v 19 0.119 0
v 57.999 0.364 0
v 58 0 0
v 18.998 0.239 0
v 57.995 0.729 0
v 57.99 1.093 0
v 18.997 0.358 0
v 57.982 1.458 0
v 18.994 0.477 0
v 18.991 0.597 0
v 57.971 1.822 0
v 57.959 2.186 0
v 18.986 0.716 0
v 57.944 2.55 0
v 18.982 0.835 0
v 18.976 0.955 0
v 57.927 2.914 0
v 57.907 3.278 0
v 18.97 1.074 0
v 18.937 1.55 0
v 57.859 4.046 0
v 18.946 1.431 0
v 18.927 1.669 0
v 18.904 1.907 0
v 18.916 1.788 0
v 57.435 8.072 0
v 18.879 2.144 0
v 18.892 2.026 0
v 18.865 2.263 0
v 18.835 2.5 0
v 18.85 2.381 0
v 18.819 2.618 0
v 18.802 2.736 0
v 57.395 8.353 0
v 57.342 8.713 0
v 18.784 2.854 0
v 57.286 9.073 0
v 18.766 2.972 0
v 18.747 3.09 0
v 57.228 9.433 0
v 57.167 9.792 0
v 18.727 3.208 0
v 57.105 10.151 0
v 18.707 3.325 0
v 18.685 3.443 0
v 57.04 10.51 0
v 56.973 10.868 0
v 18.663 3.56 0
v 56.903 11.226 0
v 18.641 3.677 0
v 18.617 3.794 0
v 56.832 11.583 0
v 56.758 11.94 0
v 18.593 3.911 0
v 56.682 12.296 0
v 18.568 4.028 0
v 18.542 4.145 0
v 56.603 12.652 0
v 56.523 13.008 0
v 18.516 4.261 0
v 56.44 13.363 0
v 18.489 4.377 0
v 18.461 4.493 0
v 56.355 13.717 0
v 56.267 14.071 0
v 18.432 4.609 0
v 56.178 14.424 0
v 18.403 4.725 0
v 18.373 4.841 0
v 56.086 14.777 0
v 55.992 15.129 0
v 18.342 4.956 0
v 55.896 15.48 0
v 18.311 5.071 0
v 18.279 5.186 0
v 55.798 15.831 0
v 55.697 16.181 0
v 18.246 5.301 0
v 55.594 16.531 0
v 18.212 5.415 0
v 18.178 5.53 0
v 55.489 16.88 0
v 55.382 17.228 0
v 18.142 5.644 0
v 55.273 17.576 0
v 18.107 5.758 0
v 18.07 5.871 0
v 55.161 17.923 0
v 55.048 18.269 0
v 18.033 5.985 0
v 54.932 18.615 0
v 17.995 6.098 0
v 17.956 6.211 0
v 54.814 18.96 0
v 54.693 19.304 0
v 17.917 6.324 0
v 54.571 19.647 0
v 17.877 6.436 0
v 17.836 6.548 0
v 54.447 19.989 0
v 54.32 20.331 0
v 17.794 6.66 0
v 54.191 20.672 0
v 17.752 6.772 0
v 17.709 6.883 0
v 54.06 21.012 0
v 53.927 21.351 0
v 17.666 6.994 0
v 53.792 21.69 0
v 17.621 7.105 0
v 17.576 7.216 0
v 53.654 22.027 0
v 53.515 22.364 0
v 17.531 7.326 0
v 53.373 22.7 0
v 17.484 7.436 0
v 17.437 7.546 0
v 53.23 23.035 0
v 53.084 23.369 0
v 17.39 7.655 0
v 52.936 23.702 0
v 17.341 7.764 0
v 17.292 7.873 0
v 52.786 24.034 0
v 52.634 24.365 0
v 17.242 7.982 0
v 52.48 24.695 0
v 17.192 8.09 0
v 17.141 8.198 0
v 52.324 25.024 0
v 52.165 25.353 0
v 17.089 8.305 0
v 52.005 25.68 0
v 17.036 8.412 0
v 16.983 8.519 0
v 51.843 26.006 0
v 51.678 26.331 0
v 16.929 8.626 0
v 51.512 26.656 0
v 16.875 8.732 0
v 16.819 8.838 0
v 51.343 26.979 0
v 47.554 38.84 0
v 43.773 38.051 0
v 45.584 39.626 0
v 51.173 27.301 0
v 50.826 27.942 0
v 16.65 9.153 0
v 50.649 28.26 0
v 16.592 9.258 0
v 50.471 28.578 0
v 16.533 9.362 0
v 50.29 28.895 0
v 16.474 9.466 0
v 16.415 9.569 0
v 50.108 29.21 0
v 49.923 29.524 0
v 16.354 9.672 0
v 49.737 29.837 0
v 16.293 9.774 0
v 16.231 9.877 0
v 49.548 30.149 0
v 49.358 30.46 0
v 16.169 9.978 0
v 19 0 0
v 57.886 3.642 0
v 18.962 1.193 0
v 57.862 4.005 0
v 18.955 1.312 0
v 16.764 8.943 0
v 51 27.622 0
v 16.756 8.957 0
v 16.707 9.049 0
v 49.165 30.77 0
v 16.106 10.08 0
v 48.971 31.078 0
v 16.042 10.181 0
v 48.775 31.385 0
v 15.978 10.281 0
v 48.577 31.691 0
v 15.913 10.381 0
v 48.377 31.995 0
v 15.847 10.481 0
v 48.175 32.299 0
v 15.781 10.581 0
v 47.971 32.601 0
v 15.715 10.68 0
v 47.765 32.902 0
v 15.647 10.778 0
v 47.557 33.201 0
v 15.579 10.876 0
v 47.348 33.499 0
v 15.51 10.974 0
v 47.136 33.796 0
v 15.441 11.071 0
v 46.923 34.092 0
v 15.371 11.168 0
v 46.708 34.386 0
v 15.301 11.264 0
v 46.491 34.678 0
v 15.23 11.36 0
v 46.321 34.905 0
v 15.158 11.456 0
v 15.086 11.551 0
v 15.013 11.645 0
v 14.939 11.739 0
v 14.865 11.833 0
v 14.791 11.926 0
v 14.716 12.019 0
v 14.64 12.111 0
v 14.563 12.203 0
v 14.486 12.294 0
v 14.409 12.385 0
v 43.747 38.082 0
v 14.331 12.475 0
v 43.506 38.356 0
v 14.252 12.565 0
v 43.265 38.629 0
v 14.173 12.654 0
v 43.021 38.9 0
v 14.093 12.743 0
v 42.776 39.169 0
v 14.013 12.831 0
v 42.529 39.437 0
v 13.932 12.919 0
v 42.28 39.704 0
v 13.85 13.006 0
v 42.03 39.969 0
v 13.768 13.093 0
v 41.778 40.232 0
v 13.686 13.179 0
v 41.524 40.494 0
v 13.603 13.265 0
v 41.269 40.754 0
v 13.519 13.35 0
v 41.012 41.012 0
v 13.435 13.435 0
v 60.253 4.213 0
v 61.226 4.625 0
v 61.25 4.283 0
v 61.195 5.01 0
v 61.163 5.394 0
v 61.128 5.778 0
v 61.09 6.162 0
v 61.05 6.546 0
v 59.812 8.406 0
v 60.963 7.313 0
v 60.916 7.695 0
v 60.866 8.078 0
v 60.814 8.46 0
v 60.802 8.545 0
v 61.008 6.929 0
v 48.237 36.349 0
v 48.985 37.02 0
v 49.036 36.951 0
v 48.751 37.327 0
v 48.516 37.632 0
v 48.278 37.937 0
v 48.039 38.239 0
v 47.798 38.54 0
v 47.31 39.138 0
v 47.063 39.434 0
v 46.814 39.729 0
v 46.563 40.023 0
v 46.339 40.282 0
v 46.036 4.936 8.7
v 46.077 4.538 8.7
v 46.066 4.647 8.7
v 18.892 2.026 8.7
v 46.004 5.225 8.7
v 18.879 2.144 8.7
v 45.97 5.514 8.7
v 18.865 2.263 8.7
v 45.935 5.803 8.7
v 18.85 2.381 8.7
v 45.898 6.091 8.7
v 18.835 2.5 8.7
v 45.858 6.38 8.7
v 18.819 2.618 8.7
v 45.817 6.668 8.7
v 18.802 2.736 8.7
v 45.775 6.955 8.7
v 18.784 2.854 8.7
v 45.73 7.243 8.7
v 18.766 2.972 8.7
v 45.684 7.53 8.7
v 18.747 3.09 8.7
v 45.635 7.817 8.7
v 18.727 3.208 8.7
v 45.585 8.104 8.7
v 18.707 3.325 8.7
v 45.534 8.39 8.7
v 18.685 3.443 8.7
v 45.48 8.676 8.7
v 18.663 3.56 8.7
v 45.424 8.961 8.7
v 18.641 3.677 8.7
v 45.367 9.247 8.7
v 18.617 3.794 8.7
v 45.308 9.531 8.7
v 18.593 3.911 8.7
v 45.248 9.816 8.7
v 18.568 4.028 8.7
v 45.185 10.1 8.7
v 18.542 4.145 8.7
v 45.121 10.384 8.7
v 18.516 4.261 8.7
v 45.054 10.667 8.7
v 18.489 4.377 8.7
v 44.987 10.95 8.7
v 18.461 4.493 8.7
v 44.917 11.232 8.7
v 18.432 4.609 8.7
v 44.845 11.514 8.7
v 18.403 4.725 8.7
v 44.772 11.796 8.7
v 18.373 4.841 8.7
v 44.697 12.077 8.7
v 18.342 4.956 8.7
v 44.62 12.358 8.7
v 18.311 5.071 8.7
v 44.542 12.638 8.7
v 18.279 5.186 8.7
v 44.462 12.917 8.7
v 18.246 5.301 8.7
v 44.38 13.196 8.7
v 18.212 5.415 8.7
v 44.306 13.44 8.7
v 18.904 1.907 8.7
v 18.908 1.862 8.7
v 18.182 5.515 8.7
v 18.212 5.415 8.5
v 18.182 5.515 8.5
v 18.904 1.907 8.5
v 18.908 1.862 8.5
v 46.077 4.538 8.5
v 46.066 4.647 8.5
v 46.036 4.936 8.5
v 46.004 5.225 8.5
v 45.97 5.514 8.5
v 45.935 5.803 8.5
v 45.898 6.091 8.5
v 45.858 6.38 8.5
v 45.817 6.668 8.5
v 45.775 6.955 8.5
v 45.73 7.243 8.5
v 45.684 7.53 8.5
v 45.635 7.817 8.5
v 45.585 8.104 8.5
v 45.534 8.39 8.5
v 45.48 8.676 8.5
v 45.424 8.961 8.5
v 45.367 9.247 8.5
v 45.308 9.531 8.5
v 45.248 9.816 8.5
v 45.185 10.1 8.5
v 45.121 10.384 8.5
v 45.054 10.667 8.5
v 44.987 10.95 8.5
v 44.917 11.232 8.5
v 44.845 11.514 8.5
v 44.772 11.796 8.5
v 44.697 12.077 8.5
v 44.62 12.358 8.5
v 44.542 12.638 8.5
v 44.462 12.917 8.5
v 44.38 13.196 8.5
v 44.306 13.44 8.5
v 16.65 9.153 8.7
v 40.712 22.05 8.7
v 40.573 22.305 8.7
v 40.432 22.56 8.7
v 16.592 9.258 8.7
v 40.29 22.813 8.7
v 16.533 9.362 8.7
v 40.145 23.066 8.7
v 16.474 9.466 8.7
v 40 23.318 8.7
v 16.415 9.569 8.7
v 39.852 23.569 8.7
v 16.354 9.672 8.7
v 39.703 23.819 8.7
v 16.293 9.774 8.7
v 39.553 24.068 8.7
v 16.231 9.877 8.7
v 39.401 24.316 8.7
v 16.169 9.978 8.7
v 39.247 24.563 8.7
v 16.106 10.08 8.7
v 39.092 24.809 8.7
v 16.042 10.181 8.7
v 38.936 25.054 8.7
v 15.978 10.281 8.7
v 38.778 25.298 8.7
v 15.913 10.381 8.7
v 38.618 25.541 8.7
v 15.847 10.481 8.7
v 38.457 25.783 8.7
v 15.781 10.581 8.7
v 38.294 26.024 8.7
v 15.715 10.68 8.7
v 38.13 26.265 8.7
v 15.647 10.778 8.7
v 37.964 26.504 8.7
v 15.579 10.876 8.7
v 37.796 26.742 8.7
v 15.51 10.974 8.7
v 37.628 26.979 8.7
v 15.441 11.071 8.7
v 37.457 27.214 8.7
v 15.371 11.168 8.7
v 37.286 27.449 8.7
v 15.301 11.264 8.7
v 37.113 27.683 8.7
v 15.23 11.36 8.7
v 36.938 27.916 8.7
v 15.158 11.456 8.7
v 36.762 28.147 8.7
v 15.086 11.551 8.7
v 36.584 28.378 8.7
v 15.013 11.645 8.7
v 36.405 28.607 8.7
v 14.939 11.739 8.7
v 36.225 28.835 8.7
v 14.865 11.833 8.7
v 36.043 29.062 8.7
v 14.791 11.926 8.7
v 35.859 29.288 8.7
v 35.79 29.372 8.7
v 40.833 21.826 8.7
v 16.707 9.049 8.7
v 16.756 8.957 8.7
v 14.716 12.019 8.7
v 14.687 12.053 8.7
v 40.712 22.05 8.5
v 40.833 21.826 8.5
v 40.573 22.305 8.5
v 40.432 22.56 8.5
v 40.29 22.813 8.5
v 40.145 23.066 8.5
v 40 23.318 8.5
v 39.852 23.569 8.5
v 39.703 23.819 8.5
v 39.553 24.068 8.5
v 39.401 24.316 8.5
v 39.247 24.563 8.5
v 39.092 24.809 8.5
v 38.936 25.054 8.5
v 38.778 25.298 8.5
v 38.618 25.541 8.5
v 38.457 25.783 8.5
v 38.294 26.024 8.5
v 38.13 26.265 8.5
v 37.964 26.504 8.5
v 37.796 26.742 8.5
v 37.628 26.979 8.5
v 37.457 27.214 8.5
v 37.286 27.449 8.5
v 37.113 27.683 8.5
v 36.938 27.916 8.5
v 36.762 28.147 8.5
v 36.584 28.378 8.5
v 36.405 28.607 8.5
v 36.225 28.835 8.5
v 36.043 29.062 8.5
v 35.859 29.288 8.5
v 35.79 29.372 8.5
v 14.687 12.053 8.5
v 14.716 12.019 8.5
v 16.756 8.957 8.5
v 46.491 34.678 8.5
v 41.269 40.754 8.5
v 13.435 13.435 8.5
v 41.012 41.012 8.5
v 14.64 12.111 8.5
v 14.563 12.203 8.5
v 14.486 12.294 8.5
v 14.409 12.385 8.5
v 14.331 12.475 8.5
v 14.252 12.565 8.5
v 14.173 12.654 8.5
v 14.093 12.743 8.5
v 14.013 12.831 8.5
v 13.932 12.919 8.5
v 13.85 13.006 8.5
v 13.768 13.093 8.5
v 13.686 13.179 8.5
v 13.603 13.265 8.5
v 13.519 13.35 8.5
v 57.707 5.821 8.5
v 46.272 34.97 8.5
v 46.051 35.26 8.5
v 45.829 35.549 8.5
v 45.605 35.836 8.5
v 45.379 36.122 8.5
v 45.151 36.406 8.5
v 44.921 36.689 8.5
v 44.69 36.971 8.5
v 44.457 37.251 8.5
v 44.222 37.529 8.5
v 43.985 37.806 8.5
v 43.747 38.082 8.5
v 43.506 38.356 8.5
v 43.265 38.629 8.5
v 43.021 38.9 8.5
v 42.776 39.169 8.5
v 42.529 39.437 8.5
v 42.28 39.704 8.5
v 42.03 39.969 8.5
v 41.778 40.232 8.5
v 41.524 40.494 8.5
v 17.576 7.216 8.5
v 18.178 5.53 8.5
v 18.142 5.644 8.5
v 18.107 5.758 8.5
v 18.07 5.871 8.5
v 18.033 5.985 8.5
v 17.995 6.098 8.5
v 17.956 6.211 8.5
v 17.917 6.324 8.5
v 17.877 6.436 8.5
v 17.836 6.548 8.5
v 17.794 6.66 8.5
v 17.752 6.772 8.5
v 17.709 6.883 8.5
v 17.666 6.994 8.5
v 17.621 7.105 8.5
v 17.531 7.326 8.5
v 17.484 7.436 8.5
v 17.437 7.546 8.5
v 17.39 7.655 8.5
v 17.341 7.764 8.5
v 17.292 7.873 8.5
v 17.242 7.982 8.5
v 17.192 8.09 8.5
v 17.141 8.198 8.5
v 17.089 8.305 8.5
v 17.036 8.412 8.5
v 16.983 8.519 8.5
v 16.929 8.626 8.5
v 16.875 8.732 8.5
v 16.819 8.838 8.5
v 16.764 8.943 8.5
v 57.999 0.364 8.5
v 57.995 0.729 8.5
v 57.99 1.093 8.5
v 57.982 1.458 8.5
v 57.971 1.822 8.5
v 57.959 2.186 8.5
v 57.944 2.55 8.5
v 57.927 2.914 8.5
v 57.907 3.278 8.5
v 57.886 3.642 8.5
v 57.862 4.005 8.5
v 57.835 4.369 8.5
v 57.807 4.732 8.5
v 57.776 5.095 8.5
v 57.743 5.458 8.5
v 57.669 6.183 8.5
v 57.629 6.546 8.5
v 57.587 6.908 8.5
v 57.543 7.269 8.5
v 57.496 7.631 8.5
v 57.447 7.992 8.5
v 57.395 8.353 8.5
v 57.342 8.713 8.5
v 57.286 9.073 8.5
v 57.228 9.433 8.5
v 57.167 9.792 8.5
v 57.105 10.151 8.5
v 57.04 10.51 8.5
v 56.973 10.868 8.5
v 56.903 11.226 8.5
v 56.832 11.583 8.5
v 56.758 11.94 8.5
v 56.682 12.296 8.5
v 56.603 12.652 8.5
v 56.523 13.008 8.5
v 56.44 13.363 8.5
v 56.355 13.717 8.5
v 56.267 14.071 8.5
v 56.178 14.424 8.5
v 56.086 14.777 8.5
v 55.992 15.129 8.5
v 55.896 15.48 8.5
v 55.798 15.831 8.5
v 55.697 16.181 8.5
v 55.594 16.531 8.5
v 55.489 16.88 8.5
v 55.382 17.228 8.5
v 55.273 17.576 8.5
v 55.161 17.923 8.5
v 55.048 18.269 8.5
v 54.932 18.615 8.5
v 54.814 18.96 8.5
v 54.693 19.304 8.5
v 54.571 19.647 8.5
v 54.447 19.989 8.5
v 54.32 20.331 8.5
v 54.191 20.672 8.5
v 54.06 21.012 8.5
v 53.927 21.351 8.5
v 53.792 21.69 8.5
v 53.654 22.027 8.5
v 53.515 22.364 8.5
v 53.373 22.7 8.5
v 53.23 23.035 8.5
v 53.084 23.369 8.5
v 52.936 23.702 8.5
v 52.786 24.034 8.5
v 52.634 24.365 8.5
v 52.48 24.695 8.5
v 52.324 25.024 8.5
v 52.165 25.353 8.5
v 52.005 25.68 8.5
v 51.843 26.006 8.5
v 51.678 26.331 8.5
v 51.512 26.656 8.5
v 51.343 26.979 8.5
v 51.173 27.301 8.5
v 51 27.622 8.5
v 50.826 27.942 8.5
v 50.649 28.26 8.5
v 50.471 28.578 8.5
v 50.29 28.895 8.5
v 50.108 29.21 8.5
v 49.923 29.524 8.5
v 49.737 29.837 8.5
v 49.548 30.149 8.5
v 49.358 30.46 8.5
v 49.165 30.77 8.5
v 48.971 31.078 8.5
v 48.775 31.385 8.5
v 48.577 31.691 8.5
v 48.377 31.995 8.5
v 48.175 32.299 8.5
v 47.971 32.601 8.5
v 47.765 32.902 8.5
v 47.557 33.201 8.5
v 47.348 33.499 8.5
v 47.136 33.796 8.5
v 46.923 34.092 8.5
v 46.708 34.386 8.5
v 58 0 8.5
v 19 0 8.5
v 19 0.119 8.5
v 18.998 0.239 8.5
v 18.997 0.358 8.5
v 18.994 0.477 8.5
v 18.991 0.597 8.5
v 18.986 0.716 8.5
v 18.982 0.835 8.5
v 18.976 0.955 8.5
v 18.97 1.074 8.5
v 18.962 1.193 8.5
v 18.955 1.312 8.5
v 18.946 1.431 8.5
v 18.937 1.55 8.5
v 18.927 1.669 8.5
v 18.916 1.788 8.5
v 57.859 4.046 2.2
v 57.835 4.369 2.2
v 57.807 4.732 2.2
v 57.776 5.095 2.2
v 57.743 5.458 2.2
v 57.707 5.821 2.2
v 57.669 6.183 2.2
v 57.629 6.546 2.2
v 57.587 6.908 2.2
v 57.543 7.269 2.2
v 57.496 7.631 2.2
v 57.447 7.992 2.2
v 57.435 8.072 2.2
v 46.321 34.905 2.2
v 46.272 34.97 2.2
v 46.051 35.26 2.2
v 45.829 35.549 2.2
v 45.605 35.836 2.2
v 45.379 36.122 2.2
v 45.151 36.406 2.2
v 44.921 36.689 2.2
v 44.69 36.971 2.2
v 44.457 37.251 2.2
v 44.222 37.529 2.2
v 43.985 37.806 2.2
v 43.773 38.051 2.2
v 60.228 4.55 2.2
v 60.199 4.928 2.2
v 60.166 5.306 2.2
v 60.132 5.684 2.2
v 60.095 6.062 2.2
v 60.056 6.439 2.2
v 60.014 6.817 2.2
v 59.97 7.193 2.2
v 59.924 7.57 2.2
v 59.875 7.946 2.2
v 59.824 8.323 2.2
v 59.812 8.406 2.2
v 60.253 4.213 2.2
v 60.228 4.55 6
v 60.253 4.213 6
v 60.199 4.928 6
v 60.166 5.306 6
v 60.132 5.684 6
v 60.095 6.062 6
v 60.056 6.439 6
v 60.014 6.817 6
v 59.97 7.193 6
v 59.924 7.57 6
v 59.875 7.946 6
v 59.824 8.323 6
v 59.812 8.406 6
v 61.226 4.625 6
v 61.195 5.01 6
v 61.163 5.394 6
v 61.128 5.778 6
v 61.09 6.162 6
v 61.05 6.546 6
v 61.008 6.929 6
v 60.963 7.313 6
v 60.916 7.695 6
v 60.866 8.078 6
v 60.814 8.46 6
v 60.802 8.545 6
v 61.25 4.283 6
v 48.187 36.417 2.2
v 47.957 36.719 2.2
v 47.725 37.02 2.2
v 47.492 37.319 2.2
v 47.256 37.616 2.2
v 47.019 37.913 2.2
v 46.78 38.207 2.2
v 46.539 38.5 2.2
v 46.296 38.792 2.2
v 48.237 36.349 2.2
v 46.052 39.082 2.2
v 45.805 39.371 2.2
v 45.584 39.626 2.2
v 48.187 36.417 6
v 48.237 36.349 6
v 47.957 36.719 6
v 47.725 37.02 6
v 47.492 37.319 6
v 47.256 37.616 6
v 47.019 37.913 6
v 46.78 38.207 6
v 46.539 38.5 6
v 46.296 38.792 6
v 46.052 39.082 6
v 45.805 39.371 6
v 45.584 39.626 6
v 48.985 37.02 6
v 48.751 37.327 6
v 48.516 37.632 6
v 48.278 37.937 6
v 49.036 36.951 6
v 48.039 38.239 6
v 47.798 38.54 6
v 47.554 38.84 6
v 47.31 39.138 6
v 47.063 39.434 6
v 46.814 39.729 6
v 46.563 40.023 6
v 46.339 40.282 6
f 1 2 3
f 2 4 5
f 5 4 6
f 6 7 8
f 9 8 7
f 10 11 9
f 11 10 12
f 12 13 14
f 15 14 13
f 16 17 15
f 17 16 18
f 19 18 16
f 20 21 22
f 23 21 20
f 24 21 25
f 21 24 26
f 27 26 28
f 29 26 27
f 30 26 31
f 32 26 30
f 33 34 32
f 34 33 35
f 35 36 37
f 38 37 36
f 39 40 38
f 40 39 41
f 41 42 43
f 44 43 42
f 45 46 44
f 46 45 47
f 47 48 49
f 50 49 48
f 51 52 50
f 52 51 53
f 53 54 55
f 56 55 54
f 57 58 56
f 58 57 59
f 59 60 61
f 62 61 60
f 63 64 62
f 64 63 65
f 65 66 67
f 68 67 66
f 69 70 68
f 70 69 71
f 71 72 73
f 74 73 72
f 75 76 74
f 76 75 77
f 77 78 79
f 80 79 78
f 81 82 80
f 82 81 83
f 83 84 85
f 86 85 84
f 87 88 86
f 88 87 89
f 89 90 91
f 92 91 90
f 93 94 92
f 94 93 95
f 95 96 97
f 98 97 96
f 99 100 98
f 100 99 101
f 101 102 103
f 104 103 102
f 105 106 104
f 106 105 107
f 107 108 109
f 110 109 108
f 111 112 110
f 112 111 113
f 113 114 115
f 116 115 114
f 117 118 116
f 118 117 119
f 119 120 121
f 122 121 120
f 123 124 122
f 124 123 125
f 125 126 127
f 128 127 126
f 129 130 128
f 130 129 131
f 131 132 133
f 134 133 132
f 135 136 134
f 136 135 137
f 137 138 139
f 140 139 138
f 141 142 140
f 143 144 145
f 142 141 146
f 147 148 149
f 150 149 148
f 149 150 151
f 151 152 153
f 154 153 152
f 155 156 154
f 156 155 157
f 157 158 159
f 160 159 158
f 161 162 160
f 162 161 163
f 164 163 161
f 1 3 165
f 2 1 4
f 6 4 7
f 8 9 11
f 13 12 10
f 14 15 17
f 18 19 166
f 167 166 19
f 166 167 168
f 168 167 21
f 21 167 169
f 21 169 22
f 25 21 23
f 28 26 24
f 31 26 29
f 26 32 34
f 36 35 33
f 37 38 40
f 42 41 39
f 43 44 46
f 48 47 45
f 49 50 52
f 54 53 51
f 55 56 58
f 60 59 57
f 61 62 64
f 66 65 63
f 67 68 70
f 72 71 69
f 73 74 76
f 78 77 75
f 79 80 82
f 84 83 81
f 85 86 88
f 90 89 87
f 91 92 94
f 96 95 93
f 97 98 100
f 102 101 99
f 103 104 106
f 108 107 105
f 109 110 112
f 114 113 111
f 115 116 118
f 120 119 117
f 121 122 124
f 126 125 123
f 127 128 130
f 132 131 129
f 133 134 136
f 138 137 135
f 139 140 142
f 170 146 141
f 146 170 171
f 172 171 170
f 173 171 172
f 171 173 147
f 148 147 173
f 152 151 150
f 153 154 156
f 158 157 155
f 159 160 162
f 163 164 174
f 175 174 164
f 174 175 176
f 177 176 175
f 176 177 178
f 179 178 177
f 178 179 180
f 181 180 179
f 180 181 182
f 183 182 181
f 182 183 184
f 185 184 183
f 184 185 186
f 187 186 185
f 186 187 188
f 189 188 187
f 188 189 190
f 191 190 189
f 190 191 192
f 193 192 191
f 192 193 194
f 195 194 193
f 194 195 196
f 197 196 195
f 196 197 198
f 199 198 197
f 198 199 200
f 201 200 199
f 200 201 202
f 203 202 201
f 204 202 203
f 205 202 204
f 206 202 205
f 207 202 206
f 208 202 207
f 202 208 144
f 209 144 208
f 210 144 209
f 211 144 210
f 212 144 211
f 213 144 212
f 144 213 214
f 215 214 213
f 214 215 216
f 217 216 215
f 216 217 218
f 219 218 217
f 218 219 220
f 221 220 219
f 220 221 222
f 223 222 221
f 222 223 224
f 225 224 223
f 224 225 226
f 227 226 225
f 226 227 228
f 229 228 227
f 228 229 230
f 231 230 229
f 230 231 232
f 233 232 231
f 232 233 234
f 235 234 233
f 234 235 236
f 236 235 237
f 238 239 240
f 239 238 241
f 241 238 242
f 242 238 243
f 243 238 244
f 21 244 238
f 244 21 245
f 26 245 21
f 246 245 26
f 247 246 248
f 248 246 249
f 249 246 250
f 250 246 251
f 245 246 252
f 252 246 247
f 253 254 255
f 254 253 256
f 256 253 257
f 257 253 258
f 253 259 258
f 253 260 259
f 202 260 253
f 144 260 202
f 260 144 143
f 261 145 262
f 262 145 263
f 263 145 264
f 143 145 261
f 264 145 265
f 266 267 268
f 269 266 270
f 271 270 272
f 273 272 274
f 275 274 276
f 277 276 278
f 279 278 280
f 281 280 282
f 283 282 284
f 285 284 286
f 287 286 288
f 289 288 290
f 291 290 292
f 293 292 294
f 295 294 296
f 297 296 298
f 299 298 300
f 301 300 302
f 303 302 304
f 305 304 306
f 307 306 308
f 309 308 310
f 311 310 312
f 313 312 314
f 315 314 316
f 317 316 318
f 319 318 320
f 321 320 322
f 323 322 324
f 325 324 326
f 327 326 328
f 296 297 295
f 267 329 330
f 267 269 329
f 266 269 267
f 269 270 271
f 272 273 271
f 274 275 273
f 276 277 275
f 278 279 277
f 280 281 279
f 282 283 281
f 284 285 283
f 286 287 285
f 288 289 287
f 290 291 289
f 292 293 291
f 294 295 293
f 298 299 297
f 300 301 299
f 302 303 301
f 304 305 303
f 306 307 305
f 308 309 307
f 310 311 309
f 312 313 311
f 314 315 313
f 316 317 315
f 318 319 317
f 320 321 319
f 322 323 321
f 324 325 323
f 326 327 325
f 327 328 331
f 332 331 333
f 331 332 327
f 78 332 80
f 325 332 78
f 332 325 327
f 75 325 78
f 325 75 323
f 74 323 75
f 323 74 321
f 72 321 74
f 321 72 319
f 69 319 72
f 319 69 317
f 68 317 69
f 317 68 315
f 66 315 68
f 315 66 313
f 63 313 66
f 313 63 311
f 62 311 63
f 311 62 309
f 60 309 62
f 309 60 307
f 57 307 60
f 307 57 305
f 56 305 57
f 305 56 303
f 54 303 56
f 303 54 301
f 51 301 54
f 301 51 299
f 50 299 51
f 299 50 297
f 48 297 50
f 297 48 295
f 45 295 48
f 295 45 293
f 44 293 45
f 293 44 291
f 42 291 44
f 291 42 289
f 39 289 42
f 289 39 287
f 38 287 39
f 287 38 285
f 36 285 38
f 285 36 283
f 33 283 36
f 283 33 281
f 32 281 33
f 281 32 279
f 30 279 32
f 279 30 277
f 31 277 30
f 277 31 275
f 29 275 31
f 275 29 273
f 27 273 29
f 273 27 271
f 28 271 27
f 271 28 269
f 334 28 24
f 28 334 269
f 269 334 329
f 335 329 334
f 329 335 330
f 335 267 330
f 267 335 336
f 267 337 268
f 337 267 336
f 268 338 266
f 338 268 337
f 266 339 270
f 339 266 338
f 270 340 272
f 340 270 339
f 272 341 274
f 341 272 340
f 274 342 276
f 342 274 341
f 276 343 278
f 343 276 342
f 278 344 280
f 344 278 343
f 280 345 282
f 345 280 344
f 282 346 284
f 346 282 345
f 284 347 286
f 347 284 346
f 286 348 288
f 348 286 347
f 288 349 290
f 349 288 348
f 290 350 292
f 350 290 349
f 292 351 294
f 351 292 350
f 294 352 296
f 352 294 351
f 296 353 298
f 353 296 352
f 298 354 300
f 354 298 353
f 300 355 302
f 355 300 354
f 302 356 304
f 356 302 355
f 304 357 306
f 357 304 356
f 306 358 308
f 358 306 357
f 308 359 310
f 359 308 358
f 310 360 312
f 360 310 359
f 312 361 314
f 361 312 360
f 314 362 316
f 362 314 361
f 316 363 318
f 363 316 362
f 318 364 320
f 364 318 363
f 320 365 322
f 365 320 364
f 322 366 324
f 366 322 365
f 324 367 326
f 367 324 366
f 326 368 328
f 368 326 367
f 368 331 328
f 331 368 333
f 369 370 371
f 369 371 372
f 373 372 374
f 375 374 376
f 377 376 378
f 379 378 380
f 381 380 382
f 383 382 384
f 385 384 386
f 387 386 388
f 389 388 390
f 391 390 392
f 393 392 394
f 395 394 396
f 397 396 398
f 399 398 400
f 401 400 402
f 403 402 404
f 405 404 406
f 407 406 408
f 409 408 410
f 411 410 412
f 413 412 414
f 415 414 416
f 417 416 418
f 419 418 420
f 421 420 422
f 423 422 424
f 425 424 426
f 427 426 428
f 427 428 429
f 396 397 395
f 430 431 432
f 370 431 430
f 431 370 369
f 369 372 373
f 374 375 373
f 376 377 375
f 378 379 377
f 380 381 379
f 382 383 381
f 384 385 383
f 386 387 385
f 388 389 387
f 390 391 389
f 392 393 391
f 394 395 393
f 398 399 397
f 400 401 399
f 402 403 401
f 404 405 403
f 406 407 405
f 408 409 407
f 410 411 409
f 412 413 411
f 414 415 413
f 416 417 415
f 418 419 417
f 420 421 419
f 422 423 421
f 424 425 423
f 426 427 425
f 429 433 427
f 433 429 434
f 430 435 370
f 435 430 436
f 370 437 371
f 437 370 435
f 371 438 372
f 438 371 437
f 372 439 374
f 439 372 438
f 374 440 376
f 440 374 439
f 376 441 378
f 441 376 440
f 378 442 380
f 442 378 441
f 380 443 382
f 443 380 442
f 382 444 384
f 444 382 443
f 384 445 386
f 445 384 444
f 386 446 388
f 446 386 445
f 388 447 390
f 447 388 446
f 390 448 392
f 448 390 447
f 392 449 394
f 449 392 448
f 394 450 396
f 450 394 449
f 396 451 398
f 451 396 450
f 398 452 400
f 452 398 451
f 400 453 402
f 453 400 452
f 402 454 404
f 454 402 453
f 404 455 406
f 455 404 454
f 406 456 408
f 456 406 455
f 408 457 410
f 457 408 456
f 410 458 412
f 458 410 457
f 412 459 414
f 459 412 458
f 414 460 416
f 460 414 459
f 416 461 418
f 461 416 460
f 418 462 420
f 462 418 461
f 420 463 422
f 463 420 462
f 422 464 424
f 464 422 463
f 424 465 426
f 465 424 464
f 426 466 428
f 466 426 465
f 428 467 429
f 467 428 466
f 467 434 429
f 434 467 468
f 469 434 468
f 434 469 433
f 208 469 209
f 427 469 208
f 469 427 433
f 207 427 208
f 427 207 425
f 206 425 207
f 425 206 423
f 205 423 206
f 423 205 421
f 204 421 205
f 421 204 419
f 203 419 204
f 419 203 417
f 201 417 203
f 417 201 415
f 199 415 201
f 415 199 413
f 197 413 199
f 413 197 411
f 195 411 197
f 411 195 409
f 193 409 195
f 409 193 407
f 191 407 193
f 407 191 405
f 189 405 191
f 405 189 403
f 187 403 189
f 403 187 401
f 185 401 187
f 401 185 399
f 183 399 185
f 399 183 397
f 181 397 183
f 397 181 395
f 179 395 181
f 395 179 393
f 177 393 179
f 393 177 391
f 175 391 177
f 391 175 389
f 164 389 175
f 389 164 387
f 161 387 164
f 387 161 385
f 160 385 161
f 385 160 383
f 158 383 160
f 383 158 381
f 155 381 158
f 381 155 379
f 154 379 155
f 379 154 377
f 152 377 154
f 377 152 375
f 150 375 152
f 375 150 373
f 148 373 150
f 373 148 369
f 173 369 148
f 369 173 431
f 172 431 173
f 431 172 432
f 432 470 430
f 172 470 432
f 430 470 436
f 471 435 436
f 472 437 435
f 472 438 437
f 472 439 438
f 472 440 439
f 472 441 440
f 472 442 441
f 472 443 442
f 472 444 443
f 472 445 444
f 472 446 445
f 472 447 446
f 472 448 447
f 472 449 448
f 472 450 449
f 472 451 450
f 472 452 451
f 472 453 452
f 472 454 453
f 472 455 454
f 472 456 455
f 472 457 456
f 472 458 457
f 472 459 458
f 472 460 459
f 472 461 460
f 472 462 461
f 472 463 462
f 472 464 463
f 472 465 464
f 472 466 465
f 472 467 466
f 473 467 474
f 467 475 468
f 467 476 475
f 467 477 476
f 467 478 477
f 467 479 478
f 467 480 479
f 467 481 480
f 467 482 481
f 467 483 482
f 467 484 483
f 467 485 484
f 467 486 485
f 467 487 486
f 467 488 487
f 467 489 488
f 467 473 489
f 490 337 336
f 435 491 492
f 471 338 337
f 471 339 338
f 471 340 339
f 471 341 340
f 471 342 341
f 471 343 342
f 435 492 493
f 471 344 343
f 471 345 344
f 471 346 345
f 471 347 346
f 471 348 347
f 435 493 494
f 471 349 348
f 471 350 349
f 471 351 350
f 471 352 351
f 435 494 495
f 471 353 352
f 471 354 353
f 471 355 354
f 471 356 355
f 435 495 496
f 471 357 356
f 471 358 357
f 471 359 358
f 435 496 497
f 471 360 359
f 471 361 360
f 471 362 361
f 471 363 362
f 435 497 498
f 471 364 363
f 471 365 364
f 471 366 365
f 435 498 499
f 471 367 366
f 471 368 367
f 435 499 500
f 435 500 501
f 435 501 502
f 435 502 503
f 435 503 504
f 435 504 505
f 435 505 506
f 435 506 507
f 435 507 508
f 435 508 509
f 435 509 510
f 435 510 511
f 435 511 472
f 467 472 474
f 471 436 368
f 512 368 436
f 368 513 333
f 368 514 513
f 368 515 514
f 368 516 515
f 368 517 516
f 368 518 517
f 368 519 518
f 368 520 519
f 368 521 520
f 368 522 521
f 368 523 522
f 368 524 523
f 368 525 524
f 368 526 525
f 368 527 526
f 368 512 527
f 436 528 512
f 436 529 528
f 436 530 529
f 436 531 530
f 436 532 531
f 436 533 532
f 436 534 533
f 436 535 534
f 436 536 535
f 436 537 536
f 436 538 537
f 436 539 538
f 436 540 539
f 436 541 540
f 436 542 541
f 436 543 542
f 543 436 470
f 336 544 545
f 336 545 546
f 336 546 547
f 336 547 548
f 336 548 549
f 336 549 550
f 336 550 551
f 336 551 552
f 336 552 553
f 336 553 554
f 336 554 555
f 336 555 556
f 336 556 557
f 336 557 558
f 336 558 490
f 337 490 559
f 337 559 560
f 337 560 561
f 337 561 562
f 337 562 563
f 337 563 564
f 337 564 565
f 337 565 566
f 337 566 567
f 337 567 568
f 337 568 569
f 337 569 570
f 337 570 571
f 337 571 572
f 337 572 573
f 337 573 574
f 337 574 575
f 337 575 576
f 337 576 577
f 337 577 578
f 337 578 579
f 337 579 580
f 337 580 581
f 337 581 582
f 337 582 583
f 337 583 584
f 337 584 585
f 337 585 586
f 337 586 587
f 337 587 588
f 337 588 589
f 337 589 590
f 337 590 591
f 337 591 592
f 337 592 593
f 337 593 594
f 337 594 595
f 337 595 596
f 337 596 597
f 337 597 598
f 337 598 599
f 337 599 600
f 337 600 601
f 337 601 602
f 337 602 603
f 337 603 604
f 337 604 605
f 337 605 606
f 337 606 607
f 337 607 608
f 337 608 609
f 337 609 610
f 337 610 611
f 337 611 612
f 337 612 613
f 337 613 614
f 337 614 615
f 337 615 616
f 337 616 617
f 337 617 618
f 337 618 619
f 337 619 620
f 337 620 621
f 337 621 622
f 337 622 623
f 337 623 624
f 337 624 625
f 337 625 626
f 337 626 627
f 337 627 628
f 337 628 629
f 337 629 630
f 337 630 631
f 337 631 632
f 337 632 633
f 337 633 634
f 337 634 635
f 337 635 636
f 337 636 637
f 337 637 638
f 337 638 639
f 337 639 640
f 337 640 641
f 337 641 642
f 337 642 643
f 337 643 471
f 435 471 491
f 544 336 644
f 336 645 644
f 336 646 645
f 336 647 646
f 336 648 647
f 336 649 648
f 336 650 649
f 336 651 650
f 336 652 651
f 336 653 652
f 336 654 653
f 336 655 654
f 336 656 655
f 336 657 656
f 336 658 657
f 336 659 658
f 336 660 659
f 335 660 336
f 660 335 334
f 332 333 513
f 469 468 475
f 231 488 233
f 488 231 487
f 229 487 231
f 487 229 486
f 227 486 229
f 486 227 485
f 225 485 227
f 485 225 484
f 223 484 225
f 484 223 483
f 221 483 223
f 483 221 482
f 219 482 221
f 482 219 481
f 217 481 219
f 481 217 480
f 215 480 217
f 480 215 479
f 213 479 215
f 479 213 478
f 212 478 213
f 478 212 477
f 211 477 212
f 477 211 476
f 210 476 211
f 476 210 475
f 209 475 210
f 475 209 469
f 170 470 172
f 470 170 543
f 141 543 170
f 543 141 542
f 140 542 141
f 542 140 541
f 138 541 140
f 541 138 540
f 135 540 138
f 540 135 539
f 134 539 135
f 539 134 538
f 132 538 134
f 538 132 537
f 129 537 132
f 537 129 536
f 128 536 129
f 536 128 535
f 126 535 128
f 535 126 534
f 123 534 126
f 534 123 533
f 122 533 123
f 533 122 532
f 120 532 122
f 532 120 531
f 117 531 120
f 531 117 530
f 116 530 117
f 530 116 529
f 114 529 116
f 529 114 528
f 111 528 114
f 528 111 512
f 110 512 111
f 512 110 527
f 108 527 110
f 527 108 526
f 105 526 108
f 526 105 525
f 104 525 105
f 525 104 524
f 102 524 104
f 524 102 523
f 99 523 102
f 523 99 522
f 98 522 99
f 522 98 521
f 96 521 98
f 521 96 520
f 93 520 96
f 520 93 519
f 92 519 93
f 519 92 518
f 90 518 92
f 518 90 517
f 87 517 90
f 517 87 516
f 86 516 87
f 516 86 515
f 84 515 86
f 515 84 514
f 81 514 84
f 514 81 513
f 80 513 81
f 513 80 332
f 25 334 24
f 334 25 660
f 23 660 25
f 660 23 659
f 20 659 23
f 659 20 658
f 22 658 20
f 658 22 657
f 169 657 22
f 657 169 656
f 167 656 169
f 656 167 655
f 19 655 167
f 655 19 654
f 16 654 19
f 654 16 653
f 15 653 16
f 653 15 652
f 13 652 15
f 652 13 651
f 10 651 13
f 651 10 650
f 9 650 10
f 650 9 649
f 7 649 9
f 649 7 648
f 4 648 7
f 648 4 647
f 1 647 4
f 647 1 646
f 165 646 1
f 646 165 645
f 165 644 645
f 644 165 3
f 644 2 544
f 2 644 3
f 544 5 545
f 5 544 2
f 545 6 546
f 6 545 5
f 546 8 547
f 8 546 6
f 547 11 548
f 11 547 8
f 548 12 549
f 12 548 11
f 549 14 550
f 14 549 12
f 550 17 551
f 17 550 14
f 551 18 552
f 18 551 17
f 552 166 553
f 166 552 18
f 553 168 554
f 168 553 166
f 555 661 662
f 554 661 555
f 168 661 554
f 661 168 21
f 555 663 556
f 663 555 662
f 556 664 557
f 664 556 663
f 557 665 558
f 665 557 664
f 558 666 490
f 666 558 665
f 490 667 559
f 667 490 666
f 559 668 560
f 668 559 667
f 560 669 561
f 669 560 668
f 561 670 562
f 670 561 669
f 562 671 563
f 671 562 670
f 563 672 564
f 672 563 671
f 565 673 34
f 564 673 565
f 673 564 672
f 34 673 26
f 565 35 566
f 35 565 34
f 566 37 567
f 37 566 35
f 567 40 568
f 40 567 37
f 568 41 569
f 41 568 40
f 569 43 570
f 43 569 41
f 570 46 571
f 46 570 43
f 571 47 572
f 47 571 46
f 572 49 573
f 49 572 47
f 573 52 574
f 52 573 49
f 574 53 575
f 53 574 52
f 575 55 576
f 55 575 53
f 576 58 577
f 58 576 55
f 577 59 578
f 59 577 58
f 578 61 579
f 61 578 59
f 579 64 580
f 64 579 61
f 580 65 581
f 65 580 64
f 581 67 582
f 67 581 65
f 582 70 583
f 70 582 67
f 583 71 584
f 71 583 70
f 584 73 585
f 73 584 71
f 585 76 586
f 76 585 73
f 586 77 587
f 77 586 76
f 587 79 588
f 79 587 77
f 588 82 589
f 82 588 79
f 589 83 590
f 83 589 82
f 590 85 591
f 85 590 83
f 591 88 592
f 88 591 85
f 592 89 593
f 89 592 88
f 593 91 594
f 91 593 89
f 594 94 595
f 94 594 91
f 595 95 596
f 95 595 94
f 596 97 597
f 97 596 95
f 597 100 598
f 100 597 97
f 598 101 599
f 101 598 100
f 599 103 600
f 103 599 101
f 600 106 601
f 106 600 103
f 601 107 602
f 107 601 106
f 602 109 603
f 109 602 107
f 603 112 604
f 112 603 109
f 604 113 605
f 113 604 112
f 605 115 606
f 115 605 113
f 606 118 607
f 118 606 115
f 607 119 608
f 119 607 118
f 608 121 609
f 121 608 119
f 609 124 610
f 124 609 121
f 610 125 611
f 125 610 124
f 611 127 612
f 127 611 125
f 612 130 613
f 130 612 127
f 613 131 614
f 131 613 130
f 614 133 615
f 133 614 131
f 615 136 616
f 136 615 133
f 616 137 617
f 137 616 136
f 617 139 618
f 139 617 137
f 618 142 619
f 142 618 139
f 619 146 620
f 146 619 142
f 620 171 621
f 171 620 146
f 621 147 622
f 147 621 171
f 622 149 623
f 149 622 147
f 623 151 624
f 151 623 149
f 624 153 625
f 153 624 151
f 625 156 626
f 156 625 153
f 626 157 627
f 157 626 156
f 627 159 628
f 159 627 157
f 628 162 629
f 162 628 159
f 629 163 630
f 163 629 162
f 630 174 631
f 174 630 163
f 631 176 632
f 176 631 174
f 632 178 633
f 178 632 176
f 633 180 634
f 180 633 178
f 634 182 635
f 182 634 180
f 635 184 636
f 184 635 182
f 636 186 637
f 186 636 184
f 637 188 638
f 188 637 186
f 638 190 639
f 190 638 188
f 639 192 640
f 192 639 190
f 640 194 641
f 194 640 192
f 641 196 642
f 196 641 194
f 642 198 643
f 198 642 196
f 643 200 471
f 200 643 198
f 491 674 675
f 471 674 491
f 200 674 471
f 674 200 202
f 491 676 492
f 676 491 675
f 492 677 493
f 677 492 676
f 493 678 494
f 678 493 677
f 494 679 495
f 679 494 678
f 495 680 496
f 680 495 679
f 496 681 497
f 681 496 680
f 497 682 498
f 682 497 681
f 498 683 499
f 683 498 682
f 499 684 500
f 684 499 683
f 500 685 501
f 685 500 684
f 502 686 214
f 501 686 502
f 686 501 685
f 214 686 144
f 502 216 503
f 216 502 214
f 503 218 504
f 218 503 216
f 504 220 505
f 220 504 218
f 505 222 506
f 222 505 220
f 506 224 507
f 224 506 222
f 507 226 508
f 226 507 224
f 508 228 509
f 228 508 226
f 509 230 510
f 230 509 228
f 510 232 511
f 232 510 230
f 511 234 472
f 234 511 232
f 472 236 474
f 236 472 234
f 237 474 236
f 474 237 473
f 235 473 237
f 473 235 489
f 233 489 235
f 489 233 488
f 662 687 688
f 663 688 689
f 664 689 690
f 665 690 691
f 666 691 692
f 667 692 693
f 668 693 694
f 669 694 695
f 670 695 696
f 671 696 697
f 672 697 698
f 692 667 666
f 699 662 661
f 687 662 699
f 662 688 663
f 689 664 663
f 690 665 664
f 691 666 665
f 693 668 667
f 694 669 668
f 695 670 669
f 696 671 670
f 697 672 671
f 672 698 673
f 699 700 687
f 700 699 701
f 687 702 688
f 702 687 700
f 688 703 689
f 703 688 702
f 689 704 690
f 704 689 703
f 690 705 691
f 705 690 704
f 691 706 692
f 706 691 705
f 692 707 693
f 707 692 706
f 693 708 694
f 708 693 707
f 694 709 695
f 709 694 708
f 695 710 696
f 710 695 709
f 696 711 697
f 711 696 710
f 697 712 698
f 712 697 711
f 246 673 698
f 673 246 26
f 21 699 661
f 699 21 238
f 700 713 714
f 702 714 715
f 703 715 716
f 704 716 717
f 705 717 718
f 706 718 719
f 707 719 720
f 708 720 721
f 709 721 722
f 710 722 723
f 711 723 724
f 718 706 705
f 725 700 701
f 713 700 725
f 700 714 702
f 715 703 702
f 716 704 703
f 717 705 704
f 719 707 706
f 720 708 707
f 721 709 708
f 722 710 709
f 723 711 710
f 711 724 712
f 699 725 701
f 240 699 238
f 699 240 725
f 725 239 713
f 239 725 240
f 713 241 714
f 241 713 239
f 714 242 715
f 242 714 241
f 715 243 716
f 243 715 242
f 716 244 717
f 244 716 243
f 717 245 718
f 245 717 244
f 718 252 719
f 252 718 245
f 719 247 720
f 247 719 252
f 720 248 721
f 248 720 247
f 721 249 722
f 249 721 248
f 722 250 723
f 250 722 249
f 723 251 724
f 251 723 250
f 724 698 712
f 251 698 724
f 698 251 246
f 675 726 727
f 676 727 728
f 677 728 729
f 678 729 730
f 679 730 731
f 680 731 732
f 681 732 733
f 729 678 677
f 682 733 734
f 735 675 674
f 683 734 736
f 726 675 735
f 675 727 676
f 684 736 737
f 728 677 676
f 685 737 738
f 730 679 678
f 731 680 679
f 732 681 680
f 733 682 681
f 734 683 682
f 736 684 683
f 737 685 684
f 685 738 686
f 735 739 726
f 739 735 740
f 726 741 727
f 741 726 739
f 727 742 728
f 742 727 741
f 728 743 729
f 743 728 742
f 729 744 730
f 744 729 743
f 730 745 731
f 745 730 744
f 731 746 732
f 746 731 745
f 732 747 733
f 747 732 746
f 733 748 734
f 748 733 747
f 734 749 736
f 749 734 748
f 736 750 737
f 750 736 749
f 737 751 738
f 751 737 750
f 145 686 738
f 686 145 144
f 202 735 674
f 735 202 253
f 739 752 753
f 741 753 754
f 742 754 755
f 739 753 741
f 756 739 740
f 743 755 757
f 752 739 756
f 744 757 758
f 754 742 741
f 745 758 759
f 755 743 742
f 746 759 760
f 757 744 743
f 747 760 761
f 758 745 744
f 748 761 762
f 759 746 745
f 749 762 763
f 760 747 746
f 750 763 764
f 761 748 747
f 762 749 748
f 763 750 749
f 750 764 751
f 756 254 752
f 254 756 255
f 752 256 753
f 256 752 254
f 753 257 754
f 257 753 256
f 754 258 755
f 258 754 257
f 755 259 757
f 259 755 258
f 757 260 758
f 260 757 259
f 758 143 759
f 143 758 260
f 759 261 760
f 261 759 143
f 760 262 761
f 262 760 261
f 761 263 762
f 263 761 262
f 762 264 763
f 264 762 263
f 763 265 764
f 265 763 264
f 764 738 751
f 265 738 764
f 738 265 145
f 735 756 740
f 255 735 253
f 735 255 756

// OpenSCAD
// file: 3d_arc.scad
// https://openhome.cc/eGossip/OpenSCAD/SectorArc.html

module sector(radius, begin, end, fn) {
    r = radius / cos(180 / fn);
    step = -360 / fn;

    points = concat([[0, 0]],
        [for(a = [begin : step : end - 360]) 
            [r * cos(a), r * sin(a)]
        ],
        [[r * cos(end), r * sin(end)]]
    );

    difference() {
        circle(radius, $fn = fn); // cilinder
        polygon(points);
    }
}

module arc(radius, begin, end, width, fn) {
    difference() {
        sector(radius + width, begin, end, fn);
        sector(radius, begin, end, fn);
    }
} 


module 3d_arc(height, radius, width, begin, end, fn) {
    linear_extrude(height) arc(radius, begin, end, width, fn);
}
// main file
// https://openhome.cc/eGossip/OpenSCAD/SectorArc.html

// width is the angle
// lenght is distance from the center of the circunference
// height is the thinkness

include <3d_arc.scad>

fn = 1000;

// kerb

kerb_radius = 58; // mm
kerb_length = 39; // mm
kerb_height = 8.5; // mm
kerb_width = 45; // deg

3d_arc(kerb_height, kerb_radius - kerb_length, kerb_length, 0, kerb_width, fn);

// hooks

hook_offset = 4; // deg
hook_width = 4; // deg
hook_bend_height = 2.2; // mm
hook_bend_length = 2.4; // mm
hook_barb_height = 6; // mm
hook_barb_length = 1; // mm

3d_arc(hook_bend_height, kerb_radius, hook_bend_length, hook_offset, hook_offset + hook_width, fn);
3d_arc(hook_barb_height, kerb_radius + hook_bend_length, hook_barb_length, hook_offset, hook_offset + hook_width, fn);

3d_arc(hook_bend_height, kerb_radius, hook_bend_length, kerb_width - hook_offset, kerb_width - hook_offset - hook_width, fn);
3d_arc(hook_barb_height, kerb_radius + hook_bend_length, hook_barb_length, kerb_width - hook_offset, kerb_width - hook_offset - hook_width, fn);

// strips

strip_count = 2; // #
strip_width = 0.5; // %
strip_length = 0.7; // %
strip_height = 0.2; // mm

strip_angle = kerb_width / strip_count;

for(i = [0 : strip_count - 1]) {
    strip_offset = i * strip_angle;
    strip_center = strip_offset + strip_angle / 2;
    begin = strip_center - strip_width * strip_angle / 2;
    end = strip_center + strip_width * strip_angle / 2;

    3d_arc(kerb_height + strip_height, kerb_radius - kerb_length, strip_length * kerb_length, begin, end, fn);
}
